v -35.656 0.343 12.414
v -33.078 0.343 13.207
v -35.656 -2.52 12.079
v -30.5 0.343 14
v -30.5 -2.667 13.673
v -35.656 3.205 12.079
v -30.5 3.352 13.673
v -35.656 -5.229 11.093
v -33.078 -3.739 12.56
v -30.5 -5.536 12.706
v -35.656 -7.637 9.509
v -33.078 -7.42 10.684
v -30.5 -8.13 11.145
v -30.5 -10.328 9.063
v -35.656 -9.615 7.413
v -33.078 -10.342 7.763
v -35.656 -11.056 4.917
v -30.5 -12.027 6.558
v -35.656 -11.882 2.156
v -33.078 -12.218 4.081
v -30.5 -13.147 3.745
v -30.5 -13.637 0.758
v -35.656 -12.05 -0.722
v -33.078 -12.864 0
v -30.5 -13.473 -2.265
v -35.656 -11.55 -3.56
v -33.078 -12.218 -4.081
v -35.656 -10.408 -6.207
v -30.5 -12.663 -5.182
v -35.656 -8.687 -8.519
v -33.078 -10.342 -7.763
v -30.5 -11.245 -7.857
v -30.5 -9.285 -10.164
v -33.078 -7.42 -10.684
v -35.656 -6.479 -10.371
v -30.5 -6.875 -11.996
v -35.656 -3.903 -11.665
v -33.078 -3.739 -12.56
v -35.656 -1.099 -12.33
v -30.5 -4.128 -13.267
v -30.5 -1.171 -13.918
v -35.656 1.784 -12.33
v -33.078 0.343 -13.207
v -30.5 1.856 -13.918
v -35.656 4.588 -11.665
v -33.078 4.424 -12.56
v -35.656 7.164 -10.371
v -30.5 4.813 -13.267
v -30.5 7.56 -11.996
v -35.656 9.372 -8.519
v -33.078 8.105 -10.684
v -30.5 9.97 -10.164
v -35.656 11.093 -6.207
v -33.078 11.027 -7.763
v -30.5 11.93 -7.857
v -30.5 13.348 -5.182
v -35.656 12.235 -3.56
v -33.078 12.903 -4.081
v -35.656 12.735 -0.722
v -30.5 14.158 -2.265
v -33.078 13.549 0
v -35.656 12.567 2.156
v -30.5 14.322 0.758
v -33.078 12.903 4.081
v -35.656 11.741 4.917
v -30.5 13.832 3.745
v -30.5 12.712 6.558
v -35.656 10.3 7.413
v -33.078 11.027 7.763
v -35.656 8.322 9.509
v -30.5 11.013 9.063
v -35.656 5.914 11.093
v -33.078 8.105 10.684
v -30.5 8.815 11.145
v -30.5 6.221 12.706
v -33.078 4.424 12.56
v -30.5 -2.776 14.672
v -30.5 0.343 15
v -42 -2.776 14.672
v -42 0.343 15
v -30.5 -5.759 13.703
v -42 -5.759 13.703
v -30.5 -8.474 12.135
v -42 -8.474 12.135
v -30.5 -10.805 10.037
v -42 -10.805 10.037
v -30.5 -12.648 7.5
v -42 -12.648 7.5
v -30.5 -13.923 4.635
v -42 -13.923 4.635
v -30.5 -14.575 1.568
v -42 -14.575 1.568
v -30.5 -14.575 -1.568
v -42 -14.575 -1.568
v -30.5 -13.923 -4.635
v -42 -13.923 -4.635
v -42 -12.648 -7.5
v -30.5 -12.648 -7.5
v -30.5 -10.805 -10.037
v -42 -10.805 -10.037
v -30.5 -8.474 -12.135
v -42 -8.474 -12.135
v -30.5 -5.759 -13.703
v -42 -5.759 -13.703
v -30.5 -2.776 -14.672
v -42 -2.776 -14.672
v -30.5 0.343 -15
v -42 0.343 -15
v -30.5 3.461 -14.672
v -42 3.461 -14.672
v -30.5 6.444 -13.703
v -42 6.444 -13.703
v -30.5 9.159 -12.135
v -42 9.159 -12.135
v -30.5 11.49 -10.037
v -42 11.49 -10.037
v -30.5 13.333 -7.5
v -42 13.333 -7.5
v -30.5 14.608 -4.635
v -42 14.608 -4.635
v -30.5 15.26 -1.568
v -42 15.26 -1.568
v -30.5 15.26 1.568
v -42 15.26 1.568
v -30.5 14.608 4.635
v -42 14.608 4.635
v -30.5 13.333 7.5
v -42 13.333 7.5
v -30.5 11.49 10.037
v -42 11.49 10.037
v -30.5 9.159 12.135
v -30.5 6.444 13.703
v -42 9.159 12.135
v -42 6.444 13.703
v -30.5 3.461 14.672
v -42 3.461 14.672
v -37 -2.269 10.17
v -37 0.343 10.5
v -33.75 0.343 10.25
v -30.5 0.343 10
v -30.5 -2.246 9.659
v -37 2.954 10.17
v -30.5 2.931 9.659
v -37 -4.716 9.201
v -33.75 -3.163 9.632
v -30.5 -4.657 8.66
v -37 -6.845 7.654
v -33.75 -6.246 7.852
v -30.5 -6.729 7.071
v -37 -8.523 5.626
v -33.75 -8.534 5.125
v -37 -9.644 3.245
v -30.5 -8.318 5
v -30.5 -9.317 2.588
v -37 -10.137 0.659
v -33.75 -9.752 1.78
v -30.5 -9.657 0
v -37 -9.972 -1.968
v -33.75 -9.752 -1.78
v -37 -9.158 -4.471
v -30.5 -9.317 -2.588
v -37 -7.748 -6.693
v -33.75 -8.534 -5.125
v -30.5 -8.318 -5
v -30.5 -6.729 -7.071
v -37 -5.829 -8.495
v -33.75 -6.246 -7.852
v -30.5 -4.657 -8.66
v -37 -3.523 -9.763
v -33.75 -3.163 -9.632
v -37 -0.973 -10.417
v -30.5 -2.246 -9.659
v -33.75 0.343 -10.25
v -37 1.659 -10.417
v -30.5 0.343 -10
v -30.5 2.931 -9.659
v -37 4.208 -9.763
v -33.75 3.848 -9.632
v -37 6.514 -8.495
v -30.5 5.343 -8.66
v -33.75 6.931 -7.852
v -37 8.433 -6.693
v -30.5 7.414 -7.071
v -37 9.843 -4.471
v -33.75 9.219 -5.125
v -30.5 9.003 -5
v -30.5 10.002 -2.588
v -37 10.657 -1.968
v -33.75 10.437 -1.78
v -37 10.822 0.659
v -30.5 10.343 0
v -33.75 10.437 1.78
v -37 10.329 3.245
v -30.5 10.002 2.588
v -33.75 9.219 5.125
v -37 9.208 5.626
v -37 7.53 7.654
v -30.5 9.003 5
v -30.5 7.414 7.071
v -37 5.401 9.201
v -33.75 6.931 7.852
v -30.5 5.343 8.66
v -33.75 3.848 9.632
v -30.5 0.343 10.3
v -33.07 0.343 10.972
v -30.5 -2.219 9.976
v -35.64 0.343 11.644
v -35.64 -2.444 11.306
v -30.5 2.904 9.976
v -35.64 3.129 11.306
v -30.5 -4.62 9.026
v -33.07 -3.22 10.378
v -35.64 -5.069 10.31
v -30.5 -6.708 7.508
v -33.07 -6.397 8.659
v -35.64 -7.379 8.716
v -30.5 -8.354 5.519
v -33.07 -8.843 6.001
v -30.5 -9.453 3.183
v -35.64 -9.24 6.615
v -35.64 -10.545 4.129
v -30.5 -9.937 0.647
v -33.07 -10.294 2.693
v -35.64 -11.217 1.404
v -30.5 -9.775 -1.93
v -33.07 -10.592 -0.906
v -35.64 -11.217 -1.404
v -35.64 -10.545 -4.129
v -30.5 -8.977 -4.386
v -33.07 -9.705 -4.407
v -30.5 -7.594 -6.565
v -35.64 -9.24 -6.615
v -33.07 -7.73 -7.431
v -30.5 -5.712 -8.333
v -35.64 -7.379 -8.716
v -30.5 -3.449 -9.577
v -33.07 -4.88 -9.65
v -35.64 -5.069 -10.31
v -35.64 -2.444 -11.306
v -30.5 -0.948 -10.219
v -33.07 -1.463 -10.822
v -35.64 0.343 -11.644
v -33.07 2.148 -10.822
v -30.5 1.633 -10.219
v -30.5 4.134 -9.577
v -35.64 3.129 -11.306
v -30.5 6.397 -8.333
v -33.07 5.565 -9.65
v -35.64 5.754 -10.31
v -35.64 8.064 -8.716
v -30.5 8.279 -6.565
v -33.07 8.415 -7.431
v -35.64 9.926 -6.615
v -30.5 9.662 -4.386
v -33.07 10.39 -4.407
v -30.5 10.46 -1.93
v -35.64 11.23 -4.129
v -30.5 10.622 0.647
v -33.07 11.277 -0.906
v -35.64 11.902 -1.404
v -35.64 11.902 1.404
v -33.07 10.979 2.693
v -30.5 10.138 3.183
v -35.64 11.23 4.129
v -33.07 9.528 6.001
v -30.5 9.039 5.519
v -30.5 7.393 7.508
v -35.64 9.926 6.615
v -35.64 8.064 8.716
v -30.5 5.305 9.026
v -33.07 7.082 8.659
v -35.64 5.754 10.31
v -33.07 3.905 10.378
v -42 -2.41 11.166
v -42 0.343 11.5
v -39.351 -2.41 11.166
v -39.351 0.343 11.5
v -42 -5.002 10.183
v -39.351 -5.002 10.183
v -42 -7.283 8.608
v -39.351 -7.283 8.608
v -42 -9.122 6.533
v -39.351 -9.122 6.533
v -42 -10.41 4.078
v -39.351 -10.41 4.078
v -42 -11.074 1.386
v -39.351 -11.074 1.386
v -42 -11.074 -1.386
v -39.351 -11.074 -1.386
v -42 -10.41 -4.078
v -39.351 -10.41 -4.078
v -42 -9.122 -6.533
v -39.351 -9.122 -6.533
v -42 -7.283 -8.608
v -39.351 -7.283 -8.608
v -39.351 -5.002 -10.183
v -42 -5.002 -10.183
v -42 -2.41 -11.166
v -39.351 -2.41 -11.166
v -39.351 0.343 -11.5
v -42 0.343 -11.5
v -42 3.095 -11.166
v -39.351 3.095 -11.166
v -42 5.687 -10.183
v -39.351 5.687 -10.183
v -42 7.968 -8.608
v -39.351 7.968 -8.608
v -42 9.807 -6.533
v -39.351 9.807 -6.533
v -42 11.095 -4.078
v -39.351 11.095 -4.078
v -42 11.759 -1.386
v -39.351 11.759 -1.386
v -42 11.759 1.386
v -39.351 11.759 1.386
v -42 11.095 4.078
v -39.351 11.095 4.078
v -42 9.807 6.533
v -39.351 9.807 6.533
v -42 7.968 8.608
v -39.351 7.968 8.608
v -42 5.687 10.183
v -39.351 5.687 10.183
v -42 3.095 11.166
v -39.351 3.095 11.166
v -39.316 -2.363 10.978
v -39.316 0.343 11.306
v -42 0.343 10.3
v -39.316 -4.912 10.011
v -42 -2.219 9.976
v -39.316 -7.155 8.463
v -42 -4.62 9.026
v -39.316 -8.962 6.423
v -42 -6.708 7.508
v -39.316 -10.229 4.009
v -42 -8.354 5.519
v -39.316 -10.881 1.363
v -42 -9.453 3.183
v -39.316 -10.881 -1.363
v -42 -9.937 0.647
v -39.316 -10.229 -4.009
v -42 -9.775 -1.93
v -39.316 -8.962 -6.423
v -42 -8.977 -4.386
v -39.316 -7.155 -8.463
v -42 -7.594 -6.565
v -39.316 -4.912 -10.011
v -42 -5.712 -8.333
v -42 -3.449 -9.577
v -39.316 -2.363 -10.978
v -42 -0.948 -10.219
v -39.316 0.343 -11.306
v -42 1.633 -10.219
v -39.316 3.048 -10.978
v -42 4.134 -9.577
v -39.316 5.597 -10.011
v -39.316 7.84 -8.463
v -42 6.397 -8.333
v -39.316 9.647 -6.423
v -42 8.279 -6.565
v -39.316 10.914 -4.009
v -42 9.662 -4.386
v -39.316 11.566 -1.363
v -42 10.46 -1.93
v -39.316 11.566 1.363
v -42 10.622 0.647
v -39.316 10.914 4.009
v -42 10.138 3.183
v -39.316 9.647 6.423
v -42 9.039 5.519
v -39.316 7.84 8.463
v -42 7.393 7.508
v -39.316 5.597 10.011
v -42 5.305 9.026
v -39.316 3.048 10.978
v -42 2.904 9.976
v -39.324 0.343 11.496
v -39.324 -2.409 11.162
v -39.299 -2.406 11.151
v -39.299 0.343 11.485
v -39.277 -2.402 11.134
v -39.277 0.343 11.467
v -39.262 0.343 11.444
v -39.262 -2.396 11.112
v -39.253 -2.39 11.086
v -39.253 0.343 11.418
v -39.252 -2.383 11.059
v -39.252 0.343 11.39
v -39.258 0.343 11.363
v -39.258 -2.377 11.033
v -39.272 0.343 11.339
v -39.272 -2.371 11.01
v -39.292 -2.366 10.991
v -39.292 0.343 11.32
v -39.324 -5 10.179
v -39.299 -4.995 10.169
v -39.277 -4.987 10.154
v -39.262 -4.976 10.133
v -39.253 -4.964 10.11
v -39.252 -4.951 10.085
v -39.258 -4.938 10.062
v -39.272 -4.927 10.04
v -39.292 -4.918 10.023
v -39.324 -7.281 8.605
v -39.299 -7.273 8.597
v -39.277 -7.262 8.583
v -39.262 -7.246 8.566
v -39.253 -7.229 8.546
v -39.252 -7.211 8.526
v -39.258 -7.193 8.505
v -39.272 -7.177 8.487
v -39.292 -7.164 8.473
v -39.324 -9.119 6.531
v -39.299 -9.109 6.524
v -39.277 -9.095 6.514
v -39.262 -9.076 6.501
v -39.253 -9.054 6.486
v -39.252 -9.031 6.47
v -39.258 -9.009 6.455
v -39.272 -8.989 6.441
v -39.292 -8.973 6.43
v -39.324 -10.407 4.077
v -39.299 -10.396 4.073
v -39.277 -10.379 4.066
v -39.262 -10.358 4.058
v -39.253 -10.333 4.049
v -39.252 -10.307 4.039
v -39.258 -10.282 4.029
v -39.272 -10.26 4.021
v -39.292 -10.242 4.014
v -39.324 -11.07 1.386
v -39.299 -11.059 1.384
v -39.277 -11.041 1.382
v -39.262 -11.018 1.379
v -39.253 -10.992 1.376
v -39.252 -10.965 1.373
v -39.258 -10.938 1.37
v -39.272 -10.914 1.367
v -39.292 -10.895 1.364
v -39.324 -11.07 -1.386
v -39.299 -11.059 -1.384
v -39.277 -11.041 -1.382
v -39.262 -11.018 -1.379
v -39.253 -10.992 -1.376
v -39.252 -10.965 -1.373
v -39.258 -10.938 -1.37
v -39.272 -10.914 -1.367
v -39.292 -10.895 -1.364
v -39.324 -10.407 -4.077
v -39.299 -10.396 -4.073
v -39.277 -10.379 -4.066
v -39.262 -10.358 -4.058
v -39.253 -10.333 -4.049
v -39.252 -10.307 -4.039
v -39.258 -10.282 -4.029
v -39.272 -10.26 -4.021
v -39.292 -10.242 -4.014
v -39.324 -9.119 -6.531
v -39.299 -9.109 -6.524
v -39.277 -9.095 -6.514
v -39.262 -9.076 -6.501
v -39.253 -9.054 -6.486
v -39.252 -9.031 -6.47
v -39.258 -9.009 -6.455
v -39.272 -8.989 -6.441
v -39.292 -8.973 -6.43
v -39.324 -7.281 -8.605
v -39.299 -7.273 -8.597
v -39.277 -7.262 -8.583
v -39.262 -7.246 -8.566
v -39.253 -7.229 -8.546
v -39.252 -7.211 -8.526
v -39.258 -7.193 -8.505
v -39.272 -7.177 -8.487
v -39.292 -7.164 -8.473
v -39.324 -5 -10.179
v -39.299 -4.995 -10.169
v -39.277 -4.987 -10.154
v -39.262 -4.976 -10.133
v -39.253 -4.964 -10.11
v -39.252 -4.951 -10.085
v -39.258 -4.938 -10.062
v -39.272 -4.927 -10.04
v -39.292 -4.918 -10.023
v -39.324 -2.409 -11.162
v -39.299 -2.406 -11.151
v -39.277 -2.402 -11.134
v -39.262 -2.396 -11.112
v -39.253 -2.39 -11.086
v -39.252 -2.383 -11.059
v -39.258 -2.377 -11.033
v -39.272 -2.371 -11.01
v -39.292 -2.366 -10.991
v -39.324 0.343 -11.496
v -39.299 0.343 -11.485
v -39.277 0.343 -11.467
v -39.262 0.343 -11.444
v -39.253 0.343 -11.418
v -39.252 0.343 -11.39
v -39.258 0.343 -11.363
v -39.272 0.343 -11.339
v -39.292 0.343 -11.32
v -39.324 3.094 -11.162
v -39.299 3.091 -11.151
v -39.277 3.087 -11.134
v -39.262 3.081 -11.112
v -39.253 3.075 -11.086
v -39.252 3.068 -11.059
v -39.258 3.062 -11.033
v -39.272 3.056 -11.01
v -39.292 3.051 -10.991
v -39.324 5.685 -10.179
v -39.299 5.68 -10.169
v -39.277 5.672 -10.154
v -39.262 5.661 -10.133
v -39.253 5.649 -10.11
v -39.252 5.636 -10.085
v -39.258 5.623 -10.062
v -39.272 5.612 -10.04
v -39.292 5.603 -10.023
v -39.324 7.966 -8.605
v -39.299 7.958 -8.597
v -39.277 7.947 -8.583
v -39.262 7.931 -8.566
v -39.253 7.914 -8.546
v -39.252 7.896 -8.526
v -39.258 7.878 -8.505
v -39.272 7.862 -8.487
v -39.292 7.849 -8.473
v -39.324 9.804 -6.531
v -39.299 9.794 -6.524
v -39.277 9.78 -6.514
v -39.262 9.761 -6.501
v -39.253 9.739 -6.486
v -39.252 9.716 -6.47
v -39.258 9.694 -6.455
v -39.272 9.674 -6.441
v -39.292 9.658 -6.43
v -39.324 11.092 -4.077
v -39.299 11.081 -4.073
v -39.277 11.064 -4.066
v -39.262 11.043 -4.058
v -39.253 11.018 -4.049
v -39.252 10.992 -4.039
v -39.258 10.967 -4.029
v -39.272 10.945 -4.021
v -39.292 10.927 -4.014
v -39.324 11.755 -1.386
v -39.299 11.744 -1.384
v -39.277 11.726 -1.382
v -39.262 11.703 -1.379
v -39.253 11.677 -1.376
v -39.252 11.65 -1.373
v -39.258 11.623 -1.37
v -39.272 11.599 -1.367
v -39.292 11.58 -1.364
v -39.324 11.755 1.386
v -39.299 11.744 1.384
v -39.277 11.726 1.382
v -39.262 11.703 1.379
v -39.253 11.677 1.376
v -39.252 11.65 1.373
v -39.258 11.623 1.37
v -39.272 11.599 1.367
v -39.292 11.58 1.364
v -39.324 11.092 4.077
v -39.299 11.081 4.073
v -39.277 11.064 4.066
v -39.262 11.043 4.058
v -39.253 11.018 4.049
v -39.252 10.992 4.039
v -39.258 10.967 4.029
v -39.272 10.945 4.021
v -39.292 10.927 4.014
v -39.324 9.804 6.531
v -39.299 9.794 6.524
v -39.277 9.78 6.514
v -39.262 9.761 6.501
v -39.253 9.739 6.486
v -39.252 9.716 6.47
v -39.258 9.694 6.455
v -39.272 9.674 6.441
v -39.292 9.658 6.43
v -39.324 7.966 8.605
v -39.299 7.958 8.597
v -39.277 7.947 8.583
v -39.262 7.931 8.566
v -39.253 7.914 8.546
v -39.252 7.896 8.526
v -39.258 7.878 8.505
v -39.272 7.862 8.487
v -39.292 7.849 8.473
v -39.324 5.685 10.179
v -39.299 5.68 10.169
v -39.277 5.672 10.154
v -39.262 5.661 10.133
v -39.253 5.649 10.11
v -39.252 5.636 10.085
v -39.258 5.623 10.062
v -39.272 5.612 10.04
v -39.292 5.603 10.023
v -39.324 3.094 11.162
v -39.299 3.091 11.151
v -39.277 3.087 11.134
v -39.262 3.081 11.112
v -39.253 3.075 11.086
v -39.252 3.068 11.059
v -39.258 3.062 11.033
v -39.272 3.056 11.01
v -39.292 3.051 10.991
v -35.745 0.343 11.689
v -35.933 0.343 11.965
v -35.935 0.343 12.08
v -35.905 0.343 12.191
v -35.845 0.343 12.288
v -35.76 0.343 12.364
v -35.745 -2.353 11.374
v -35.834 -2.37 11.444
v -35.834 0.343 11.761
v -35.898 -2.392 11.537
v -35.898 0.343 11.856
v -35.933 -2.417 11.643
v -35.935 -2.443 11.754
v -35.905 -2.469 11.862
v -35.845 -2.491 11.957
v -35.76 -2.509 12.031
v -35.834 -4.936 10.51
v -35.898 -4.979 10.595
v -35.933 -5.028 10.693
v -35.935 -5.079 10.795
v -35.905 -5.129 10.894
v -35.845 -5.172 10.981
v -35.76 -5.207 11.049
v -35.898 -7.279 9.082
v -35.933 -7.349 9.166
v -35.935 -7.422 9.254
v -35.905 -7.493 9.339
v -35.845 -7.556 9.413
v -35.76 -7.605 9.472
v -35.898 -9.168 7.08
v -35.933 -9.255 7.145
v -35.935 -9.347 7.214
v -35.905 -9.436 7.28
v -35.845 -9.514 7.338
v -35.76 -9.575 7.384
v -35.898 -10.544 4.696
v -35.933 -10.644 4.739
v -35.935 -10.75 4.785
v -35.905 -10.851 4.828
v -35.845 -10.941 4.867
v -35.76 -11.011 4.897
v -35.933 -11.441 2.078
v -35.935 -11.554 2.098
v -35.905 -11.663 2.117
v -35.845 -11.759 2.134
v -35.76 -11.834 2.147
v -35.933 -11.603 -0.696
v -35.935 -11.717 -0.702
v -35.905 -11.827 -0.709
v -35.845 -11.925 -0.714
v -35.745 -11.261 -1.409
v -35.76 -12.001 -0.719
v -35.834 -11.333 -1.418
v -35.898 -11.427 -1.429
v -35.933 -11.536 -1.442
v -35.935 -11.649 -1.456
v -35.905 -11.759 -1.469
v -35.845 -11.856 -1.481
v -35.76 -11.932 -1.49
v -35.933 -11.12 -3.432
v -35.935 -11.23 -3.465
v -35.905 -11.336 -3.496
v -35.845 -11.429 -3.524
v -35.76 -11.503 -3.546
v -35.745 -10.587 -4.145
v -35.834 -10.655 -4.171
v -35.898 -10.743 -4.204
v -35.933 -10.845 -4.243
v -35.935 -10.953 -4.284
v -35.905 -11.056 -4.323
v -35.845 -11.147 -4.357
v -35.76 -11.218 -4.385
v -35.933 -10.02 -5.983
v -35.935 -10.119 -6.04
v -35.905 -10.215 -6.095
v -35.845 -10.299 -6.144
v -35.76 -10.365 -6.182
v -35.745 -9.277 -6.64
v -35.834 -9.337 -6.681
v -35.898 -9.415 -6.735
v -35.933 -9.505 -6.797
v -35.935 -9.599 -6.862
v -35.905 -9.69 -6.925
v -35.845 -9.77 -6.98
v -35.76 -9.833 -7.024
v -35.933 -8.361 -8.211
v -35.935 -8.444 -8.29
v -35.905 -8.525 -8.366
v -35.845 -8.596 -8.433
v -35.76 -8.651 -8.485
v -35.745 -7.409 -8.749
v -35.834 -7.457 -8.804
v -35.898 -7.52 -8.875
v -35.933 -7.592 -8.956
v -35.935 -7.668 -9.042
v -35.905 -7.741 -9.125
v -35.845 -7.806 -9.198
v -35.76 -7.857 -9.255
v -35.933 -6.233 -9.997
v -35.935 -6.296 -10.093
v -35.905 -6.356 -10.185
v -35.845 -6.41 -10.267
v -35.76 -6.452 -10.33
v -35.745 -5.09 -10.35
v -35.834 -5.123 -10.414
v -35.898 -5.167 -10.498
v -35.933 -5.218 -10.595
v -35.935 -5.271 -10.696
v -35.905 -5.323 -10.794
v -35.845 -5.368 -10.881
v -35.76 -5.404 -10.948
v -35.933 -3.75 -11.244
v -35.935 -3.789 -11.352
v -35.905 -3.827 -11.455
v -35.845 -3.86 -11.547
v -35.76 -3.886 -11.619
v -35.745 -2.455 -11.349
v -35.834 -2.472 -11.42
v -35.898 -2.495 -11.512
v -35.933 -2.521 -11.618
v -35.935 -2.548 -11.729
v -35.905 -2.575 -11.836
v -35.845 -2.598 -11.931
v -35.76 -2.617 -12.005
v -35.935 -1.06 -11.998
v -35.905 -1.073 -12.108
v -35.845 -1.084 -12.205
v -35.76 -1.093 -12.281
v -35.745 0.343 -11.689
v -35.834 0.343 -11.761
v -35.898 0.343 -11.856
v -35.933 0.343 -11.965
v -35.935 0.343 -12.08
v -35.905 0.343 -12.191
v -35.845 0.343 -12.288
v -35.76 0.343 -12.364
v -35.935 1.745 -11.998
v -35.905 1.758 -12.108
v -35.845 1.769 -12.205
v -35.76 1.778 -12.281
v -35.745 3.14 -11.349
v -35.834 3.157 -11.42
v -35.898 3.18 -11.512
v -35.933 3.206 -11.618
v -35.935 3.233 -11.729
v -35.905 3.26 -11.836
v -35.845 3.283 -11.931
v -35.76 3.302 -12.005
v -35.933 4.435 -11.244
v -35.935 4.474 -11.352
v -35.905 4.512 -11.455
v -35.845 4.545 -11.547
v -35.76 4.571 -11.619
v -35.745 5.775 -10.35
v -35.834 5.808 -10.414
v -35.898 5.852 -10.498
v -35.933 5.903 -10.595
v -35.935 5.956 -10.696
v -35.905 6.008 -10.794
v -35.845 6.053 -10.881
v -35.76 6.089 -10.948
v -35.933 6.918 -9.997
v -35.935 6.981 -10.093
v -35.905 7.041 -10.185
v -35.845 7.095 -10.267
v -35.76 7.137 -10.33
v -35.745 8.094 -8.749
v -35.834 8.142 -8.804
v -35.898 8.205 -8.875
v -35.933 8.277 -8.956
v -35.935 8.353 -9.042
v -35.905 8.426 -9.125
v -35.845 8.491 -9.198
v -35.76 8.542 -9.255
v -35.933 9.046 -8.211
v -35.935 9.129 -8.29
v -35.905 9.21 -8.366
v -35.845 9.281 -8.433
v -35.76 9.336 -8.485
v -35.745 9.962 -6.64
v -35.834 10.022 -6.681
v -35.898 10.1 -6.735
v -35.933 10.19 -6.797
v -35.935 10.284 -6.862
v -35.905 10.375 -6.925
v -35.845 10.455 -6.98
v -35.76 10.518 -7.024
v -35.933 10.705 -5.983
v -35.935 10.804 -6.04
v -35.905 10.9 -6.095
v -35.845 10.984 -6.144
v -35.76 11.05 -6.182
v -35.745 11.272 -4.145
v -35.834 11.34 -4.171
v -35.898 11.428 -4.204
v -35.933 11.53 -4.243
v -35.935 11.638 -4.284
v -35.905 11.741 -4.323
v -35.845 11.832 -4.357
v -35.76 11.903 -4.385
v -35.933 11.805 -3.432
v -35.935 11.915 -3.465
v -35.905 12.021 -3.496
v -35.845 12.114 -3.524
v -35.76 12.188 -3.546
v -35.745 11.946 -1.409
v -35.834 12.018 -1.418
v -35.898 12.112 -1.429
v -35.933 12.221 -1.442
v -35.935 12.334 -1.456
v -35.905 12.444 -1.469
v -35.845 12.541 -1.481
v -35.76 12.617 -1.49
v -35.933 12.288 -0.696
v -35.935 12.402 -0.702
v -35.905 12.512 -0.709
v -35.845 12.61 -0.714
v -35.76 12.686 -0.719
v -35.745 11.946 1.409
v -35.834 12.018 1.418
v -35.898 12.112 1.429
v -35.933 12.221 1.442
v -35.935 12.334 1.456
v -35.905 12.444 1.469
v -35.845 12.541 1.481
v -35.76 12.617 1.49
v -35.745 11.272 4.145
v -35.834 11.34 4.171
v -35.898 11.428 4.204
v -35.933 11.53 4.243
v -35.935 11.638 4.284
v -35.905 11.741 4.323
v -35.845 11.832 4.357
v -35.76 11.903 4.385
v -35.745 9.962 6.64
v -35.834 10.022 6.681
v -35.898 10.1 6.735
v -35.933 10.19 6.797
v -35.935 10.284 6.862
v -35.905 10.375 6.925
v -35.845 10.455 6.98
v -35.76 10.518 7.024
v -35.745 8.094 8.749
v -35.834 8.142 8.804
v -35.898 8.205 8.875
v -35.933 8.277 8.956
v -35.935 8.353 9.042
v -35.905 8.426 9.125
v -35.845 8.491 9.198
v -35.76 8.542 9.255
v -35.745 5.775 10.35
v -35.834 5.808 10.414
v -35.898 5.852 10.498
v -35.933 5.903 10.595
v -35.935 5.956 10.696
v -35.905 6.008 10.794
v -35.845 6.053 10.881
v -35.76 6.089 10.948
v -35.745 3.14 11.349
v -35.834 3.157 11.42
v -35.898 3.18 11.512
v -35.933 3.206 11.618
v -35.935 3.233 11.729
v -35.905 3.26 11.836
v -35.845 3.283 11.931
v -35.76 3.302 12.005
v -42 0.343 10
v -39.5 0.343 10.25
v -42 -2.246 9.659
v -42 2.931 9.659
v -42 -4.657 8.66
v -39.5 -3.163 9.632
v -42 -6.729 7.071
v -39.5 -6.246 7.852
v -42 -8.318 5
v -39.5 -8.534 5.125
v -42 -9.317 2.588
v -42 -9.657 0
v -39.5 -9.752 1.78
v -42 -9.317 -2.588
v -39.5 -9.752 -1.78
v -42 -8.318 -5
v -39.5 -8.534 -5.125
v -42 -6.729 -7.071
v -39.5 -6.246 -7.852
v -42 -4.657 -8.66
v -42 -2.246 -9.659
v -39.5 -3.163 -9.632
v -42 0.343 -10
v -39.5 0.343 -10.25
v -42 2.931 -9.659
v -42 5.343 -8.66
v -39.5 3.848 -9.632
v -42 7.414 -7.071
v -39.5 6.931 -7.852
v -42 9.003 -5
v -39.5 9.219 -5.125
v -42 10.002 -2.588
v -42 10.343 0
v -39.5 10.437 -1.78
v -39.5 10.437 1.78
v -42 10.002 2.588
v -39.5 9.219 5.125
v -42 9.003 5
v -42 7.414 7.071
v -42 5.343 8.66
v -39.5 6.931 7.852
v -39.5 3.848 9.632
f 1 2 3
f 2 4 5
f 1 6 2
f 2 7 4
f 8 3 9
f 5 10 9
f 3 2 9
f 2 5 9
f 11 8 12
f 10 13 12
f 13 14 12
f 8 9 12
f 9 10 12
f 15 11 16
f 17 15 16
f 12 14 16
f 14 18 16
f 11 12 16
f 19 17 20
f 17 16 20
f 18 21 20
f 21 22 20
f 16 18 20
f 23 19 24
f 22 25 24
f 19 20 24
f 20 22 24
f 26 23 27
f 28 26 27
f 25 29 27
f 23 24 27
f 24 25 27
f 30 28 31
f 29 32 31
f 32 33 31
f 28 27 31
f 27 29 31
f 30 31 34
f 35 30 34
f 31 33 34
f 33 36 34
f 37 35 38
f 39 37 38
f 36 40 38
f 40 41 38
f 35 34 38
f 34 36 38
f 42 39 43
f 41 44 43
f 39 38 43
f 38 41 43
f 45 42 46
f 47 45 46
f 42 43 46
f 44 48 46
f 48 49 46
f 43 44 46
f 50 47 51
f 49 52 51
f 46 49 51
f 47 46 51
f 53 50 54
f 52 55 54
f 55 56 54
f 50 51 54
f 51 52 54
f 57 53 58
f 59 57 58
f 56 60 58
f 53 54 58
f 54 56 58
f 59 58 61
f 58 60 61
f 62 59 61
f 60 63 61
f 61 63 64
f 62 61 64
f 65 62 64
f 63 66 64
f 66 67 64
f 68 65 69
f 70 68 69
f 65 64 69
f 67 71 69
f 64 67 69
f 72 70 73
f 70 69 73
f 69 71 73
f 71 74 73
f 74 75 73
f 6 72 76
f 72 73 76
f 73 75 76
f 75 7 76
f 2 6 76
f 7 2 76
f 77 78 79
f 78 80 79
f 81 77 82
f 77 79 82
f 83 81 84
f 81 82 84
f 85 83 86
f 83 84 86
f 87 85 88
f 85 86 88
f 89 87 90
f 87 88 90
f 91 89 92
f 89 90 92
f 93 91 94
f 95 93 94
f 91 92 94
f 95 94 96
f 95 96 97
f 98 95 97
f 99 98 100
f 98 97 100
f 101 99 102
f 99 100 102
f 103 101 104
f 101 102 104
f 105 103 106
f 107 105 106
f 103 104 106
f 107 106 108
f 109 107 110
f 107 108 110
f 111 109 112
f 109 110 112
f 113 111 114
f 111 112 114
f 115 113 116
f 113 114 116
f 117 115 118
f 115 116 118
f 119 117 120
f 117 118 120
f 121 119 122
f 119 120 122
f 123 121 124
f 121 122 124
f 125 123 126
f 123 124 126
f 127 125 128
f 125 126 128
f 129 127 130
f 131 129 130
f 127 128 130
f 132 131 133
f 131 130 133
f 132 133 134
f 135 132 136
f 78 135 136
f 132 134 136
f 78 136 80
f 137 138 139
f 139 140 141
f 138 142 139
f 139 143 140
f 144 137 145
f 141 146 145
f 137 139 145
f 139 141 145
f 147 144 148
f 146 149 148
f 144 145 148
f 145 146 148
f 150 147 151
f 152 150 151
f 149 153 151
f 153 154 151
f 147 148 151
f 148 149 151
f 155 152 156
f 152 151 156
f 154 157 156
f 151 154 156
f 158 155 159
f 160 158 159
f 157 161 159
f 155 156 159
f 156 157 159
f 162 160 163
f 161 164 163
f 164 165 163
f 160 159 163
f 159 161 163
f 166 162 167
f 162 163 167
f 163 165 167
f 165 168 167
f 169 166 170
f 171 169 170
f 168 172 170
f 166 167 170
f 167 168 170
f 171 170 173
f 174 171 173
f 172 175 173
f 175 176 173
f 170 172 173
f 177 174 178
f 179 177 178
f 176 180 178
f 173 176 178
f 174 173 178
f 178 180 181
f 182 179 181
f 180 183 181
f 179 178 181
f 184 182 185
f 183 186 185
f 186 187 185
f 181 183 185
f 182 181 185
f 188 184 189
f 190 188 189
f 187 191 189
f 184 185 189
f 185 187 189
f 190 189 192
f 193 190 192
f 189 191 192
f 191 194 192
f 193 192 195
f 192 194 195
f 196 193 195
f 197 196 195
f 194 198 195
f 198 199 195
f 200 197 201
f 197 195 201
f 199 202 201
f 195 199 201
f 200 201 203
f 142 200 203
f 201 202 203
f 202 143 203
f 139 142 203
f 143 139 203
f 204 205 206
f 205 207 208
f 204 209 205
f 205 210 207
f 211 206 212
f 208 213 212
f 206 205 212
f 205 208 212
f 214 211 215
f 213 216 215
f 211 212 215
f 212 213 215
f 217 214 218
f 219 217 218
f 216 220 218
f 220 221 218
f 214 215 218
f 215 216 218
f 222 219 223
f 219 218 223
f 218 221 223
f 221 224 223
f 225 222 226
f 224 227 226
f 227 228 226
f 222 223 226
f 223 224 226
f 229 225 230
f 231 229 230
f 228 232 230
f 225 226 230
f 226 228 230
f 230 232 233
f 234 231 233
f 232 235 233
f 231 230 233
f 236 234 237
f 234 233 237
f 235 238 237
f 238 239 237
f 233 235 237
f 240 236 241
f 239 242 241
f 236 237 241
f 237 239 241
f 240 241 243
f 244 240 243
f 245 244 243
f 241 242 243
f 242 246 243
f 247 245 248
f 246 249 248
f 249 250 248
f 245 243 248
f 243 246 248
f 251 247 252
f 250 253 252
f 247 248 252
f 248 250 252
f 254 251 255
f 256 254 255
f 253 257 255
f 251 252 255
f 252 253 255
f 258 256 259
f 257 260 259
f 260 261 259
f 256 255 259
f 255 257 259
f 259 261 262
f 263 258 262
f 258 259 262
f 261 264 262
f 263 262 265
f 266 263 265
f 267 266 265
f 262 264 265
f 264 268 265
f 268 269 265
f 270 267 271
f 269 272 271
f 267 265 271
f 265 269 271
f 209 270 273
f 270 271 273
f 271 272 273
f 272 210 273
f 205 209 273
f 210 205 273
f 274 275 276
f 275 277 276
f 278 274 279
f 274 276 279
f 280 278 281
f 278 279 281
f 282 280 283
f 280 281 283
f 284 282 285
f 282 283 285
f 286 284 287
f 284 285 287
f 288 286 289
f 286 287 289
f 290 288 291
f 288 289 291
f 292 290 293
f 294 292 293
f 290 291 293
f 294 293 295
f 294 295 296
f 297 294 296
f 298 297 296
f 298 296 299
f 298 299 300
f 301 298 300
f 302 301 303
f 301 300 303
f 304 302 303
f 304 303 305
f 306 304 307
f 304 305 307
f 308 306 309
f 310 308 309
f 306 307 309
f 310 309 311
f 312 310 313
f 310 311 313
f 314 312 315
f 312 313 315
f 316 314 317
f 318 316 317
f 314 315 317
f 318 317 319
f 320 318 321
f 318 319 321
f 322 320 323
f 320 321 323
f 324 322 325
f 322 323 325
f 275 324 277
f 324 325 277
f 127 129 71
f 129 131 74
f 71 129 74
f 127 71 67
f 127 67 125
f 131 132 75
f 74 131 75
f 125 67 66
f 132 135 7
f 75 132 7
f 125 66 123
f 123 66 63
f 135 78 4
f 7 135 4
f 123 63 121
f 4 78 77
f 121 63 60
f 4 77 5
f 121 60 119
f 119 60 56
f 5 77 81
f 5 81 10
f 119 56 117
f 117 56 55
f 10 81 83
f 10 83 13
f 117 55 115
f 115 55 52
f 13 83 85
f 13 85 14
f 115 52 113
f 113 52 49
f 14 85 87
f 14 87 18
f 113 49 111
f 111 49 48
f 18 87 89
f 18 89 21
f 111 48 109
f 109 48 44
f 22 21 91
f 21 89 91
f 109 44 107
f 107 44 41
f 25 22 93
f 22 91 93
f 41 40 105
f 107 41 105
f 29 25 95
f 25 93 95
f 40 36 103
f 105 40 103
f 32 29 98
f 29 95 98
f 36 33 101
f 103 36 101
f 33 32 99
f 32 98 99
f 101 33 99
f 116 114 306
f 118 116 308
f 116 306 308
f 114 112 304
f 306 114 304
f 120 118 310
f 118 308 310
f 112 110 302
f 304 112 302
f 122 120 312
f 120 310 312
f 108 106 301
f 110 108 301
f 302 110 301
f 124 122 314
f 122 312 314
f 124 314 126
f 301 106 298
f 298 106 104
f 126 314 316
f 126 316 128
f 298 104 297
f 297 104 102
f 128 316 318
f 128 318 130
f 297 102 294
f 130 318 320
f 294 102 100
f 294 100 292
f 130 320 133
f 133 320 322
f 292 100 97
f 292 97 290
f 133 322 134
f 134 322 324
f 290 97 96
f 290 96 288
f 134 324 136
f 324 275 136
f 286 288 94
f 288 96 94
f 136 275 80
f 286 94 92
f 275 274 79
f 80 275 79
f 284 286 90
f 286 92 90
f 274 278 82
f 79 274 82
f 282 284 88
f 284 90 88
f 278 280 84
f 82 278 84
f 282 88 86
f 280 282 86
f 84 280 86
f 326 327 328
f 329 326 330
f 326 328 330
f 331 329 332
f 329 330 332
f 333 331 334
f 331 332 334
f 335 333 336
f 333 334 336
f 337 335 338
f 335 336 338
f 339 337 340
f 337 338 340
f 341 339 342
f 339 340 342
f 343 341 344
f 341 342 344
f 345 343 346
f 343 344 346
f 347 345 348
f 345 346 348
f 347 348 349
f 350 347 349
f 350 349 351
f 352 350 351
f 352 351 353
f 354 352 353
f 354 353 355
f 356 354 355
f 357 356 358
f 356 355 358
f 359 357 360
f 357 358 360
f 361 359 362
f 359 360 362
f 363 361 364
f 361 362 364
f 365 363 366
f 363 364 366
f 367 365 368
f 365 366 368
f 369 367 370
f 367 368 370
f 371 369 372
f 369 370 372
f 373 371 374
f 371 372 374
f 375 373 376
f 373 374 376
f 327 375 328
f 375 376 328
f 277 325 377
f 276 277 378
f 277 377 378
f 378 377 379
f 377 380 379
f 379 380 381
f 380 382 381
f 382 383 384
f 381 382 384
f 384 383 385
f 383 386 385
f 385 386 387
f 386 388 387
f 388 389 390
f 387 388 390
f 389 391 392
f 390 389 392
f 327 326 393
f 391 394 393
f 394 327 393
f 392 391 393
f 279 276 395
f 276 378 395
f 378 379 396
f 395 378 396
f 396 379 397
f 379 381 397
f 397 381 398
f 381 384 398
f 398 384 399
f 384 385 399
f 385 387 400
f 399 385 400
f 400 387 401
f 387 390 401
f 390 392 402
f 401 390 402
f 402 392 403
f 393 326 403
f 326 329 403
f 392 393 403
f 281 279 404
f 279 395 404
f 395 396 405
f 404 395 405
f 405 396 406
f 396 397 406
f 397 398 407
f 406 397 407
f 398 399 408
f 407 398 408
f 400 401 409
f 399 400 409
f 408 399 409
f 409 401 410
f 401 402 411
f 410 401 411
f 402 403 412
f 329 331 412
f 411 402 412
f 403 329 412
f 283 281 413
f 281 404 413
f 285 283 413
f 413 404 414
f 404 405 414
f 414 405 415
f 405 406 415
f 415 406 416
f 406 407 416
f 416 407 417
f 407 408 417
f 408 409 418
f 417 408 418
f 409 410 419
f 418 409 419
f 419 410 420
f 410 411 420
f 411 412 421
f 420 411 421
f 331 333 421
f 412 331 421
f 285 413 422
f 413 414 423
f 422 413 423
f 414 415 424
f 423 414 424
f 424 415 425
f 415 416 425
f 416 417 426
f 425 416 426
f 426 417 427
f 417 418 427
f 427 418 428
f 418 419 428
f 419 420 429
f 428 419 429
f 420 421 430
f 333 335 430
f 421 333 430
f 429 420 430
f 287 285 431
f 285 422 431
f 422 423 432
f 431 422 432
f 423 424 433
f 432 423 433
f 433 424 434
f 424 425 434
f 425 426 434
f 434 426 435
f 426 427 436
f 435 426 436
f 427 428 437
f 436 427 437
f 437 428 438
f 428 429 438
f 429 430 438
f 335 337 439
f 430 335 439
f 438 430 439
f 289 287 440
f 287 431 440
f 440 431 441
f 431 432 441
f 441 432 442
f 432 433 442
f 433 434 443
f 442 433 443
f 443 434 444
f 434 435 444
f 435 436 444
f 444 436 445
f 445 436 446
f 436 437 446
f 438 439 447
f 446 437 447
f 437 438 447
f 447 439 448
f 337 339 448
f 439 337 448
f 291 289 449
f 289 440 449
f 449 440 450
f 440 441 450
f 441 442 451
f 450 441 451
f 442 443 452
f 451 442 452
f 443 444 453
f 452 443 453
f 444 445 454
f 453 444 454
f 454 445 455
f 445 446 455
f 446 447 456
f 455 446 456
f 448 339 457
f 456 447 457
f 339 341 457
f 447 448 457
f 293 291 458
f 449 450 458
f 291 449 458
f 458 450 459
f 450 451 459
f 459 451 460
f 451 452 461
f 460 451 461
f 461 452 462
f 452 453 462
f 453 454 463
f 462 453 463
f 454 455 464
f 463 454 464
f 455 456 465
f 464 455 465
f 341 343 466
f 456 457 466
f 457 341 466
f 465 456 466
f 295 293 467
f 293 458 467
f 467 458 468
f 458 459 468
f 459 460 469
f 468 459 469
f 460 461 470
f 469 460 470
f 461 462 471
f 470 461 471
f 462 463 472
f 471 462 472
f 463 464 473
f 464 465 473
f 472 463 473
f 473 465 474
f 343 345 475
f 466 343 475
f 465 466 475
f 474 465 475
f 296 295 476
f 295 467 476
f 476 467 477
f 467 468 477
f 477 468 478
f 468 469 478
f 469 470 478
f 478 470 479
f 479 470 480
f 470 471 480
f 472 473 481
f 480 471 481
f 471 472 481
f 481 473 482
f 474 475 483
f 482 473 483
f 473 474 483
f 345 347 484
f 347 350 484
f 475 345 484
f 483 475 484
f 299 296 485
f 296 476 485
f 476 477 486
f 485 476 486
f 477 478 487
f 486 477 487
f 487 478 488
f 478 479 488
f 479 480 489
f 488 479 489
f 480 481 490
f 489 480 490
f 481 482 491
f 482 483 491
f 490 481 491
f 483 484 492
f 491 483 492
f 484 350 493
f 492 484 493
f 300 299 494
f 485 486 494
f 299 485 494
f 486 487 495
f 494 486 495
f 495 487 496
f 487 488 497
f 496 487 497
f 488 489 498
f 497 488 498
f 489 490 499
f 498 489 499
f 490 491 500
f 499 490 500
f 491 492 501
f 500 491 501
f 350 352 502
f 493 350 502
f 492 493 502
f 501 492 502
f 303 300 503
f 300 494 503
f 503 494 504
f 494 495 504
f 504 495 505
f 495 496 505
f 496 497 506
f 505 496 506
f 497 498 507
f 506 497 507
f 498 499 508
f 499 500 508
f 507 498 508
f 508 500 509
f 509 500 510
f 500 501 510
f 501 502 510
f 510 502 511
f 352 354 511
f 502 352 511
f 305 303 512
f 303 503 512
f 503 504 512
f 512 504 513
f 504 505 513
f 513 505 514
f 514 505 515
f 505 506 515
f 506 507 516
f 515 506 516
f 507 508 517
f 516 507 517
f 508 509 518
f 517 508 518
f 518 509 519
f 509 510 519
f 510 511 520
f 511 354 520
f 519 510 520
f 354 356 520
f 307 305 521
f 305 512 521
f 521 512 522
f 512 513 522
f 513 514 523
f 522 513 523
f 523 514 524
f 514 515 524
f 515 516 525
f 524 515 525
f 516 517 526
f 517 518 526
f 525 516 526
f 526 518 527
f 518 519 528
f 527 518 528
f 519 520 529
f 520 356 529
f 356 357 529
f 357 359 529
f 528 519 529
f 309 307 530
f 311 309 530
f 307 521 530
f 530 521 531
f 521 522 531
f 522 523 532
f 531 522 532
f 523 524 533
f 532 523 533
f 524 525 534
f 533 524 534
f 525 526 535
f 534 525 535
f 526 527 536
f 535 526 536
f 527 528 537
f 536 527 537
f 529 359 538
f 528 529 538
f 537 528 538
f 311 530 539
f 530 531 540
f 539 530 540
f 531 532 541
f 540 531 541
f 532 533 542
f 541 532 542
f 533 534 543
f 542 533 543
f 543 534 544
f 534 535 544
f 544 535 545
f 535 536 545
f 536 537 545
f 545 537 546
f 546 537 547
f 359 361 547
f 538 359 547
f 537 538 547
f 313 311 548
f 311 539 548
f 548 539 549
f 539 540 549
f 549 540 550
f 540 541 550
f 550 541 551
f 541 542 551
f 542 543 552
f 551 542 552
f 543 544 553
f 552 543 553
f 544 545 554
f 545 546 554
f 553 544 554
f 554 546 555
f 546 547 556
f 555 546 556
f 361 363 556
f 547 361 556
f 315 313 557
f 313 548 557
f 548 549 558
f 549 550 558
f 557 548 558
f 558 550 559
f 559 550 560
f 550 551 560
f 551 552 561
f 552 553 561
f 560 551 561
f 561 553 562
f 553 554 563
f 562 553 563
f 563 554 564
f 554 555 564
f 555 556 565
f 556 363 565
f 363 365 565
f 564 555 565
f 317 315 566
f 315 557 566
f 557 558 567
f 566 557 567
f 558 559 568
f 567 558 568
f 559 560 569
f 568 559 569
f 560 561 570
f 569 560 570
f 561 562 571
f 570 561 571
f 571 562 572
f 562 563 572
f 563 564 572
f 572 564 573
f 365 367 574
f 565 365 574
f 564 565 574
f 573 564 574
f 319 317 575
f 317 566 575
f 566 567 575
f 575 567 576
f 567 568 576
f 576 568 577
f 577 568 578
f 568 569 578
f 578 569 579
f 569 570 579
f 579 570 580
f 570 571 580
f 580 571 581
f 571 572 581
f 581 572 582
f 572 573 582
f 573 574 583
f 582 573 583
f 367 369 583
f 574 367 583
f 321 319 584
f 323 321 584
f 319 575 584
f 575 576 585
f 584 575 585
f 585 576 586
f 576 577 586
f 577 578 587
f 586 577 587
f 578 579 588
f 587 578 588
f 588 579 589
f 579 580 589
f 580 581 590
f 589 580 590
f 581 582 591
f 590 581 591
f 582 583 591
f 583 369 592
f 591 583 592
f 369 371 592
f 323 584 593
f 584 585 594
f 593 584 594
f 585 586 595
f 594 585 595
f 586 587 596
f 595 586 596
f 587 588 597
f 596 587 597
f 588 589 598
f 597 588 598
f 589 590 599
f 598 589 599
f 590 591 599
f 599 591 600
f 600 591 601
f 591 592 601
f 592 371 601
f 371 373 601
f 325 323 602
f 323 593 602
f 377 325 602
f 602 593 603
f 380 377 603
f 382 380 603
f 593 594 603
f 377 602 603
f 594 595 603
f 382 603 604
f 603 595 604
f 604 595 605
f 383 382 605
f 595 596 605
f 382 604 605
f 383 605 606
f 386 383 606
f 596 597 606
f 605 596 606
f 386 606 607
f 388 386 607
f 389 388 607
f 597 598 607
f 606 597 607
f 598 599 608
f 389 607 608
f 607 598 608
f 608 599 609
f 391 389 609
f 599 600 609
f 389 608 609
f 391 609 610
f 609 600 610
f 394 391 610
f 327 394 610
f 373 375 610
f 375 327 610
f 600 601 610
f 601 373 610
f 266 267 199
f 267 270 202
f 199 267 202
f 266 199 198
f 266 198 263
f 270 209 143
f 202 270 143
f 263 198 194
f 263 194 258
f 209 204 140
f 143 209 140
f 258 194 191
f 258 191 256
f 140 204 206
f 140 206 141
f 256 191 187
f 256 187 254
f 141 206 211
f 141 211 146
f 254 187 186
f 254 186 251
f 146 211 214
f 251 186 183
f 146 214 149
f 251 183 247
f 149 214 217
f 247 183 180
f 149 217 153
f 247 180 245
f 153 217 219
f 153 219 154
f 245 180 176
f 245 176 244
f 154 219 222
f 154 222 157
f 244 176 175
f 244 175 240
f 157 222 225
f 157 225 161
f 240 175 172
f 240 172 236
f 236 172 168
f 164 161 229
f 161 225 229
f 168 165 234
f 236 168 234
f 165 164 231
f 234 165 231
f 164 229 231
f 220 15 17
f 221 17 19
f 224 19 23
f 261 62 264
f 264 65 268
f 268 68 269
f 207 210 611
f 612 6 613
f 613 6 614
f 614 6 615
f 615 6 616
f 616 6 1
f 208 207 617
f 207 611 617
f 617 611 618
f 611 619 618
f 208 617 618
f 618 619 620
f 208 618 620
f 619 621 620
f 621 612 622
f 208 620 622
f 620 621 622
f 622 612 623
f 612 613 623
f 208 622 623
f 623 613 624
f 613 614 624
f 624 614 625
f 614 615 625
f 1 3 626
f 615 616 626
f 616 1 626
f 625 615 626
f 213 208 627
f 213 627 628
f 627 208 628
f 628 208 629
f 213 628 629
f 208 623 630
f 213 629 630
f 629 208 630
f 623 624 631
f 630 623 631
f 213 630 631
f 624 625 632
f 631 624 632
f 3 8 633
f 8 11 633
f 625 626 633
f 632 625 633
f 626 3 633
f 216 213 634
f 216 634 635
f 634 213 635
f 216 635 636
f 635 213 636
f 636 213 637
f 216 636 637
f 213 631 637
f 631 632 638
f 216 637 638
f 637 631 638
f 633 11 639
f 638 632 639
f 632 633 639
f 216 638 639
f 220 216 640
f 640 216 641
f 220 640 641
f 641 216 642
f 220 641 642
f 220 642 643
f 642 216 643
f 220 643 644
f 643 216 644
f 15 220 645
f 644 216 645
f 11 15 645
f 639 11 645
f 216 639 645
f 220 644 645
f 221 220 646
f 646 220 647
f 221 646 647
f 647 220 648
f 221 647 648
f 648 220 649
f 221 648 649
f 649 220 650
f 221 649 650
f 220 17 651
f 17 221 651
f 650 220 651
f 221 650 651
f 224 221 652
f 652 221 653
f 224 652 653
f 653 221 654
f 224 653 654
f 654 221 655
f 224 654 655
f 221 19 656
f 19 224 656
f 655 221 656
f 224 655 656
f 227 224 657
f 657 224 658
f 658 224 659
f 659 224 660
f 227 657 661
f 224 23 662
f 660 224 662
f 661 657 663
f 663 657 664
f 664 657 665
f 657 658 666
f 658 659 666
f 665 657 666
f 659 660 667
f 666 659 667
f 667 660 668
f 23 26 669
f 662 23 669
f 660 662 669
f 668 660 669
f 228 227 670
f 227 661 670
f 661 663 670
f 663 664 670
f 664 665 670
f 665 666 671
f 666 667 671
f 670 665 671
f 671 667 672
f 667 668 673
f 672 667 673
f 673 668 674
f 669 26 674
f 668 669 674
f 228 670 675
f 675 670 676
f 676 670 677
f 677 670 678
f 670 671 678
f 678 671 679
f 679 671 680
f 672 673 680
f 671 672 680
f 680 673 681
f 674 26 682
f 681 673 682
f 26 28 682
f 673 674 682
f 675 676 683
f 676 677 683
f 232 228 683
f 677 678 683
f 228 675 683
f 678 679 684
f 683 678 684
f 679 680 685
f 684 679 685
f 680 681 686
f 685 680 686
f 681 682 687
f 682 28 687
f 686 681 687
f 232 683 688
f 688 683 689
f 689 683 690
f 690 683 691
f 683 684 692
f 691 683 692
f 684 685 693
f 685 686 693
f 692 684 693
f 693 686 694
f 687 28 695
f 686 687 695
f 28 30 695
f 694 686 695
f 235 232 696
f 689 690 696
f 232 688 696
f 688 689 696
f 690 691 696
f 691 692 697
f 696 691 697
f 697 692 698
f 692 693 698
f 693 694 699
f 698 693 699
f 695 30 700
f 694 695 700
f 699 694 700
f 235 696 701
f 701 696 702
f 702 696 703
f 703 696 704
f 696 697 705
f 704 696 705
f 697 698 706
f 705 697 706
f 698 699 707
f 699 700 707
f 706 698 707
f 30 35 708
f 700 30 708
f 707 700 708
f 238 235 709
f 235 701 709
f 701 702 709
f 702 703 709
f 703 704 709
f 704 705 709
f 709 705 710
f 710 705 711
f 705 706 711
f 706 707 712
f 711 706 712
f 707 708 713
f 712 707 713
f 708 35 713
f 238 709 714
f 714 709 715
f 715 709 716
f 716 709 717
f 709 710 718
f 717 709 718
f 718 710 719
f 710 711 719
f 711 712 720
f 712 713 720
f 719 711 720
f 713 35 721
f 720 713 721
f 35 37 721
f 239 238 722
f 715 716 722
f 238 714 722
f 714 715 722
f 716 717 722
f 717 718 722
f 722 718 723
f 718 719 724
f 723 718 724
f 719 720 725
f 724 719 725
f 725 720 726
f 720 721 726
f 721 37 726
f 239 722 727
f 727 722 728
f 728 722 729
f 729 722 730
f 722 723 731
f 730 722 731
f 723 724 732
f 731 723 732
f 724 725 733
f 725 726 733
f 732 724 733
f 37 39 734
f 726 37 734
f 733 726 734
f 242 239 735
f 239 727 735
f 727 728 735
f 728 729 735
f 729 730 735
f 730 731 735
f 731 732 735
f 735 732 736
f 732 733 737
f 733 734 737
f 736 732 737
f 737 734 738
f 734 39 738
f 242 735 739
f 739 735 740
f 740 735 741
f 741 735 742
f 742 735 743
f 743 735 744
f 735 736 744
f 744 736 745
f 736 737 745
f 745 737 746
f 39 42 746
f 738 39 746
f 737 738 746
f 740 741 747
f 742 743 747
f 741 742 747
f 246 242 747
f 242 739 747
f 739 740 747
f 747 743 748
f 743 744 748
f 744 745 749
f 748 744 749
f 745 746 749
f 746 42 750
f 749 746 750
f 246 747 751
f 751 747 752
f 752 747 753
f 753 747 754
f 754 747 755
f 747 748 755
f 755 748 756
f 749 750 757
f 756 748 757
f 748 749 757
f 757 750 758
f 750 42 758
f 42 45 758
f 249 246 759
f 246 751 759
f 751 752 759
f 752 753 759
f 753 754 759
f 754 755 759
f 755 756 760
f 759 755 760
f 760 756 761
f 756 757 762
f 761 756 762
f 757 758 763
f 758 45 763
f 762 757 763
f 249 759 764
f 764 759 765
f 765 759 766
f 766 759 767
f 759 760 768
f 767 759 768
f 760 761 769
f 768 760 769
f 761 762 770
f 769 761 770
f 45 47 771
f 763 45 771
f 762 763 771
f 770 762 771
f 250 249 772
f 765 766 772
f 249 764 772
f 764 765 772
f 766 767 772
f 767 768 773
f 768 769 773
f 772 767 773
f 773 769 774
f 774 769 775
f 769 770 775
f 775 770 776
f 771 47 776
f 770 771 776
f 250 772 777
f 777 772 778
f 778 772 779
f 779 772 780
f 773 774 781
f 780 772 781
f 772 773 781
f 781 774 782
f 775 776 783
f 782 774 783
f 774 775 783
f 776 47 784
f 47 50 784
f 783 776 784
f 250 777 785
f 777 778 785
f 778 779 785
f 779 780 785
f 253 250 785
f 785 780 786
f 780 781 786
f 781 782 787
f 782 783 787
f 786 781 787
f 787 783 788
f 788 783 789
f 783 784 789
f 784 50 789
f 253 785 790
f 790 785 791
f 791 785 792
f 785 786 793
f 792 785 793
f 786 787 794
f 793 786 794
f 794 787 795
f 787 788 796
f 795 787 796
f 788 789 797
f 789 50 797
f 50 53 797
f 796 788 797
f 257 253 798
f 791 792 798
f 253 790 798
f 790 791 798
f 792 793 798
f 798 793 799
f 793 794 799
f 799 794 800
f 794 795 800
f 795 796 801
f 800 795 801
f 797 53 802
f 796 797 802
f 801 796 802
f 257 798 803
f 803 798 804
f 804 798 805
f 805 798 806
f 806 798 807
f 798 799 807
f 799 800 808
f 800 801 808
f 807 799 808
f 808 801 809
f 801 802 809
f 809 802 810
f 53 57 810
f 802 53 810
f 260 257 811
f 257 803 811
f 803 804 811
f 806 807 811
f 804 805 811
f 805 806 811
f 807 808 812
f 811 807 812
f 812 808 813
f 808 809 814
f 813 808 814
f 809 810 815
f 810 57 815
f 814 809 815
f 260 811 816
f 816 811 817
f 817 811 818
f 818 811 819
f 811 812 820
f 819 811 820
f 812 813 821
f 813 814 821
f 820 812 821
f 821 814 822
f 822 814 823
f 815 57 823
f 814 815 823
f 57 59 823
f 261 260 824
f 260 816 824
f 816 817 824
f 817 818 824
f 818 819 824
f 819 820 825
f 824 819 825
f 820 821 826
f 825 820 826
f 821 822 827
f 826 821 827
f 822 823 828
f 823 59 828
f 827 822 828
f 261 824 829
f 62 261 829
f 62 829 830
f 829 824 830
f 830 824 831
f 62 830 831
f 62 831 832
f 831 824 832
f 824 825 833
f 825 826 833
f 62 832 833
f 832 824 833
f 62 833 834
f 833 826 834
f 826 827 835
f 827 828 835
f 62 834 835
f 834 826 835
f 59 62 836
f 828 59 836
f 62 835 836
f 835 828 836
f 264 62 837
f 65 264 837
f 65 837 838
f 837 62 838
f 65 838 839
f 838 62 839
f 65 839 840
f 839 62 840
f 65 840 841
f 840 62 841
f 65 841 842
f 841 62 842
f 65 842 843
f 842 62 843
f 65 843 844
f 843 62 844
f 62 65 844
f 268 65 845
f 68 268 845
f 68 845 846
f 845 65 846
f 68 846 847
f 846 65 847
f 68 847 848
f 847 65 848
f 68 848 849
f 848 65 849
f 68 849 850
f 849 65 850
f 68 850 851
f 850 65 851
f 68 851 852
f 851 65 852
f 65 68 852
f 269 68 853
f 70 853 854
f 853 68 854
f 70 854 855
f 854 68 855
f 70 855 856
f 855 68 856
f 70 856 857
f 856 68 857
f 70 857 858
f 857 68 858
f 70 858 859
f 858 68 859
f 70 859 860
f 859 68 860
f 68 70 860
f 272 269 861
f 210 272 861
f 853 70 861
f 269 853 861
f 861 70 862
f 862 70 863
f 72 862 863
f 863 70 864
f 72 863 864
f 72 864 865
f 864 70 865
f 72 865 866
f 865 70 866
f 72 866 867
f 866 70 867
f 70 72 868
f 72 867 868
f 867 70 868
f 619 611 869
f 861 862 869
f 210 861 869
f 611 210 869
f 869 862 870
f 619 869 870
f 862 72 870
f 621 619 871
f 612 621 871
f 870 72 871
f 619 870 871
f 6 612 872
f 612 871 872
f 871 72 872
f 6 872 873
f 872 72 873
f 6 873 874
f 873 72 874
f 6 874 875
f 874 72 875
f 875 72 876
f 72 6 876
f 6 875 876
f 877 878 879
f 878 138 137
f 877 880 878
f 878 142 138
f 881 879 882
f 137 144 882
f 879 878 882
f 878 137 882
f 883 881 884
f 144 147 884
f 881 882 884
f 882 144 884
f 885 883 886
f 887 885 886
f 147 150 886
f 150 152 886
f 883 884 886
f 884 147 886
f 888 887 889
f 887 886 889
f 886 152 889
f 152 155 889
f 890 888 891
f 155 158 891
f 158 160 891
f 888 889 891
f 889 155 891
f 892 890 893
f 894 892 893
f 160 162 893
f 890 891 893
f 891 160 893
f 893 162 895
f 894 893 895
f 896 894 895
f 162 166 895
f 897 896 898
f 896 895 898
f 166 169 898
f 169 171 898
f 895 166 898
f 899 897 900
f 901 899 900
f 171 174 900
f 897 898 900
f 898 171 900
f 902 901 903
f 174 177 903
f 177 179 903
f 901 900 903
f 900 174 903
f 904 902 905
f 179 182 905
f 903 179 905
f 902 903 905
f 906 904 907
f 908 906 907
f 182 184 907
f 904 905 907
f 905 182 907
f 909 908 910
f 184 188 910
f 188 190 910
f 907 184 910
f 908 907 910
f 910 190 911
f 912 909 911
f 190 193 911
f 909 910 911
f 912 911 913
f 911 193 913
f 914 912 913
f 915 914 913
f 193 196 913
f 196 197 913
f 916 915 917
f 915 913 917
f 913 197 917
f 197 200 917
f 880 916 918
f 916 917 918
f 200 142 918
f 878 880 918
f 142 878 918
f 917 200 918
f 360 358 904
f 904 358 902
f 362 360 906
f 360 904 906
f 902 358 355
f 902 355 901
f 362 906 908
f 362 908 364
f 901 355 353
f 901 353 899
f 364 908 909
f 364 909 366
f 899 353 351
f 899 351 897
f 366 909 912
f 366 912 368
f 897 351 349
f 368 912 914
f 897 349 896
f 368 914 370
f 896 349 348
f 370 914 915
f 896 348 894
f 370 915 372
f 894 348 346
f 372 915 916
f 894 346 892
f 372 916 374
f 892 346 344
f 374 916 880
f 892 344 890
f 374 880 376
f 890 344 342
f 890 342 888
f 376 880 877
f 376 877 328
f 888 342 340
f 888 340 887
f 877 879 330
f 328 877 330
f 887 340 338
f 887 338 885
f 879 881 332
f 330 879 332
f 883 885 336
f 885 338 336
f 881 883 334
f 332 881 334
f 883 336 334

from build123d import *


with BuildPart() as part:
    # Szkic1 → Obrót1 (revolve)
    with BuildSketch(Plane.XY, mode=Mode.PRIVATE) as obr_t1_sk:
        with BuildLine():
            Line((-30.5, 15.342508556), (-42, 15.342508556))
            Line((-42, 15.342508556), (-42, 11.842508556))
            Line((-42, 11.842508556), (-39.351466792, 11.842508556))
            ThreePointArc((-39.351466792, 11.842508556), (-39.253071436, 11.760351037), (-39.316354447, 11.648875638))
            Line((-39.316354447, 11.648875638), (-42, 10.642508556))
            Line((-42, 10.642508556), (-42, 10.342508556))
            Line((-42, 10.342508556), (-37, 10.842508556))
            Line((-37, 10.842508556), (-30.5, 10.342508556))
            Line((-30.5, 10.342508556), (-30.5, 10.642508556))
            Line((-30.5, 10.642508556), (-35.639658009, 11.986726805))
            ThreePointArc((-35.639658009, 11.986726805), (-35.938355792, 12.365172989), (-35.656081251, 12.756022017))
            Line((-35.656081251, 12.756022017), (-30.5, 14.342508556))
            Line((-30.5, 14.342508556), (-30.5, 15.342508556))
        make_face()
    revolve(obr_t1_sk.sketch.rotate(Axis((-61.483966901, 0.342508556, 0), (1, 0, 0)), 90), axis=Axis((-61.483966901, 0.342508556, 0), (1, 0, 0)))


solid = part.part
